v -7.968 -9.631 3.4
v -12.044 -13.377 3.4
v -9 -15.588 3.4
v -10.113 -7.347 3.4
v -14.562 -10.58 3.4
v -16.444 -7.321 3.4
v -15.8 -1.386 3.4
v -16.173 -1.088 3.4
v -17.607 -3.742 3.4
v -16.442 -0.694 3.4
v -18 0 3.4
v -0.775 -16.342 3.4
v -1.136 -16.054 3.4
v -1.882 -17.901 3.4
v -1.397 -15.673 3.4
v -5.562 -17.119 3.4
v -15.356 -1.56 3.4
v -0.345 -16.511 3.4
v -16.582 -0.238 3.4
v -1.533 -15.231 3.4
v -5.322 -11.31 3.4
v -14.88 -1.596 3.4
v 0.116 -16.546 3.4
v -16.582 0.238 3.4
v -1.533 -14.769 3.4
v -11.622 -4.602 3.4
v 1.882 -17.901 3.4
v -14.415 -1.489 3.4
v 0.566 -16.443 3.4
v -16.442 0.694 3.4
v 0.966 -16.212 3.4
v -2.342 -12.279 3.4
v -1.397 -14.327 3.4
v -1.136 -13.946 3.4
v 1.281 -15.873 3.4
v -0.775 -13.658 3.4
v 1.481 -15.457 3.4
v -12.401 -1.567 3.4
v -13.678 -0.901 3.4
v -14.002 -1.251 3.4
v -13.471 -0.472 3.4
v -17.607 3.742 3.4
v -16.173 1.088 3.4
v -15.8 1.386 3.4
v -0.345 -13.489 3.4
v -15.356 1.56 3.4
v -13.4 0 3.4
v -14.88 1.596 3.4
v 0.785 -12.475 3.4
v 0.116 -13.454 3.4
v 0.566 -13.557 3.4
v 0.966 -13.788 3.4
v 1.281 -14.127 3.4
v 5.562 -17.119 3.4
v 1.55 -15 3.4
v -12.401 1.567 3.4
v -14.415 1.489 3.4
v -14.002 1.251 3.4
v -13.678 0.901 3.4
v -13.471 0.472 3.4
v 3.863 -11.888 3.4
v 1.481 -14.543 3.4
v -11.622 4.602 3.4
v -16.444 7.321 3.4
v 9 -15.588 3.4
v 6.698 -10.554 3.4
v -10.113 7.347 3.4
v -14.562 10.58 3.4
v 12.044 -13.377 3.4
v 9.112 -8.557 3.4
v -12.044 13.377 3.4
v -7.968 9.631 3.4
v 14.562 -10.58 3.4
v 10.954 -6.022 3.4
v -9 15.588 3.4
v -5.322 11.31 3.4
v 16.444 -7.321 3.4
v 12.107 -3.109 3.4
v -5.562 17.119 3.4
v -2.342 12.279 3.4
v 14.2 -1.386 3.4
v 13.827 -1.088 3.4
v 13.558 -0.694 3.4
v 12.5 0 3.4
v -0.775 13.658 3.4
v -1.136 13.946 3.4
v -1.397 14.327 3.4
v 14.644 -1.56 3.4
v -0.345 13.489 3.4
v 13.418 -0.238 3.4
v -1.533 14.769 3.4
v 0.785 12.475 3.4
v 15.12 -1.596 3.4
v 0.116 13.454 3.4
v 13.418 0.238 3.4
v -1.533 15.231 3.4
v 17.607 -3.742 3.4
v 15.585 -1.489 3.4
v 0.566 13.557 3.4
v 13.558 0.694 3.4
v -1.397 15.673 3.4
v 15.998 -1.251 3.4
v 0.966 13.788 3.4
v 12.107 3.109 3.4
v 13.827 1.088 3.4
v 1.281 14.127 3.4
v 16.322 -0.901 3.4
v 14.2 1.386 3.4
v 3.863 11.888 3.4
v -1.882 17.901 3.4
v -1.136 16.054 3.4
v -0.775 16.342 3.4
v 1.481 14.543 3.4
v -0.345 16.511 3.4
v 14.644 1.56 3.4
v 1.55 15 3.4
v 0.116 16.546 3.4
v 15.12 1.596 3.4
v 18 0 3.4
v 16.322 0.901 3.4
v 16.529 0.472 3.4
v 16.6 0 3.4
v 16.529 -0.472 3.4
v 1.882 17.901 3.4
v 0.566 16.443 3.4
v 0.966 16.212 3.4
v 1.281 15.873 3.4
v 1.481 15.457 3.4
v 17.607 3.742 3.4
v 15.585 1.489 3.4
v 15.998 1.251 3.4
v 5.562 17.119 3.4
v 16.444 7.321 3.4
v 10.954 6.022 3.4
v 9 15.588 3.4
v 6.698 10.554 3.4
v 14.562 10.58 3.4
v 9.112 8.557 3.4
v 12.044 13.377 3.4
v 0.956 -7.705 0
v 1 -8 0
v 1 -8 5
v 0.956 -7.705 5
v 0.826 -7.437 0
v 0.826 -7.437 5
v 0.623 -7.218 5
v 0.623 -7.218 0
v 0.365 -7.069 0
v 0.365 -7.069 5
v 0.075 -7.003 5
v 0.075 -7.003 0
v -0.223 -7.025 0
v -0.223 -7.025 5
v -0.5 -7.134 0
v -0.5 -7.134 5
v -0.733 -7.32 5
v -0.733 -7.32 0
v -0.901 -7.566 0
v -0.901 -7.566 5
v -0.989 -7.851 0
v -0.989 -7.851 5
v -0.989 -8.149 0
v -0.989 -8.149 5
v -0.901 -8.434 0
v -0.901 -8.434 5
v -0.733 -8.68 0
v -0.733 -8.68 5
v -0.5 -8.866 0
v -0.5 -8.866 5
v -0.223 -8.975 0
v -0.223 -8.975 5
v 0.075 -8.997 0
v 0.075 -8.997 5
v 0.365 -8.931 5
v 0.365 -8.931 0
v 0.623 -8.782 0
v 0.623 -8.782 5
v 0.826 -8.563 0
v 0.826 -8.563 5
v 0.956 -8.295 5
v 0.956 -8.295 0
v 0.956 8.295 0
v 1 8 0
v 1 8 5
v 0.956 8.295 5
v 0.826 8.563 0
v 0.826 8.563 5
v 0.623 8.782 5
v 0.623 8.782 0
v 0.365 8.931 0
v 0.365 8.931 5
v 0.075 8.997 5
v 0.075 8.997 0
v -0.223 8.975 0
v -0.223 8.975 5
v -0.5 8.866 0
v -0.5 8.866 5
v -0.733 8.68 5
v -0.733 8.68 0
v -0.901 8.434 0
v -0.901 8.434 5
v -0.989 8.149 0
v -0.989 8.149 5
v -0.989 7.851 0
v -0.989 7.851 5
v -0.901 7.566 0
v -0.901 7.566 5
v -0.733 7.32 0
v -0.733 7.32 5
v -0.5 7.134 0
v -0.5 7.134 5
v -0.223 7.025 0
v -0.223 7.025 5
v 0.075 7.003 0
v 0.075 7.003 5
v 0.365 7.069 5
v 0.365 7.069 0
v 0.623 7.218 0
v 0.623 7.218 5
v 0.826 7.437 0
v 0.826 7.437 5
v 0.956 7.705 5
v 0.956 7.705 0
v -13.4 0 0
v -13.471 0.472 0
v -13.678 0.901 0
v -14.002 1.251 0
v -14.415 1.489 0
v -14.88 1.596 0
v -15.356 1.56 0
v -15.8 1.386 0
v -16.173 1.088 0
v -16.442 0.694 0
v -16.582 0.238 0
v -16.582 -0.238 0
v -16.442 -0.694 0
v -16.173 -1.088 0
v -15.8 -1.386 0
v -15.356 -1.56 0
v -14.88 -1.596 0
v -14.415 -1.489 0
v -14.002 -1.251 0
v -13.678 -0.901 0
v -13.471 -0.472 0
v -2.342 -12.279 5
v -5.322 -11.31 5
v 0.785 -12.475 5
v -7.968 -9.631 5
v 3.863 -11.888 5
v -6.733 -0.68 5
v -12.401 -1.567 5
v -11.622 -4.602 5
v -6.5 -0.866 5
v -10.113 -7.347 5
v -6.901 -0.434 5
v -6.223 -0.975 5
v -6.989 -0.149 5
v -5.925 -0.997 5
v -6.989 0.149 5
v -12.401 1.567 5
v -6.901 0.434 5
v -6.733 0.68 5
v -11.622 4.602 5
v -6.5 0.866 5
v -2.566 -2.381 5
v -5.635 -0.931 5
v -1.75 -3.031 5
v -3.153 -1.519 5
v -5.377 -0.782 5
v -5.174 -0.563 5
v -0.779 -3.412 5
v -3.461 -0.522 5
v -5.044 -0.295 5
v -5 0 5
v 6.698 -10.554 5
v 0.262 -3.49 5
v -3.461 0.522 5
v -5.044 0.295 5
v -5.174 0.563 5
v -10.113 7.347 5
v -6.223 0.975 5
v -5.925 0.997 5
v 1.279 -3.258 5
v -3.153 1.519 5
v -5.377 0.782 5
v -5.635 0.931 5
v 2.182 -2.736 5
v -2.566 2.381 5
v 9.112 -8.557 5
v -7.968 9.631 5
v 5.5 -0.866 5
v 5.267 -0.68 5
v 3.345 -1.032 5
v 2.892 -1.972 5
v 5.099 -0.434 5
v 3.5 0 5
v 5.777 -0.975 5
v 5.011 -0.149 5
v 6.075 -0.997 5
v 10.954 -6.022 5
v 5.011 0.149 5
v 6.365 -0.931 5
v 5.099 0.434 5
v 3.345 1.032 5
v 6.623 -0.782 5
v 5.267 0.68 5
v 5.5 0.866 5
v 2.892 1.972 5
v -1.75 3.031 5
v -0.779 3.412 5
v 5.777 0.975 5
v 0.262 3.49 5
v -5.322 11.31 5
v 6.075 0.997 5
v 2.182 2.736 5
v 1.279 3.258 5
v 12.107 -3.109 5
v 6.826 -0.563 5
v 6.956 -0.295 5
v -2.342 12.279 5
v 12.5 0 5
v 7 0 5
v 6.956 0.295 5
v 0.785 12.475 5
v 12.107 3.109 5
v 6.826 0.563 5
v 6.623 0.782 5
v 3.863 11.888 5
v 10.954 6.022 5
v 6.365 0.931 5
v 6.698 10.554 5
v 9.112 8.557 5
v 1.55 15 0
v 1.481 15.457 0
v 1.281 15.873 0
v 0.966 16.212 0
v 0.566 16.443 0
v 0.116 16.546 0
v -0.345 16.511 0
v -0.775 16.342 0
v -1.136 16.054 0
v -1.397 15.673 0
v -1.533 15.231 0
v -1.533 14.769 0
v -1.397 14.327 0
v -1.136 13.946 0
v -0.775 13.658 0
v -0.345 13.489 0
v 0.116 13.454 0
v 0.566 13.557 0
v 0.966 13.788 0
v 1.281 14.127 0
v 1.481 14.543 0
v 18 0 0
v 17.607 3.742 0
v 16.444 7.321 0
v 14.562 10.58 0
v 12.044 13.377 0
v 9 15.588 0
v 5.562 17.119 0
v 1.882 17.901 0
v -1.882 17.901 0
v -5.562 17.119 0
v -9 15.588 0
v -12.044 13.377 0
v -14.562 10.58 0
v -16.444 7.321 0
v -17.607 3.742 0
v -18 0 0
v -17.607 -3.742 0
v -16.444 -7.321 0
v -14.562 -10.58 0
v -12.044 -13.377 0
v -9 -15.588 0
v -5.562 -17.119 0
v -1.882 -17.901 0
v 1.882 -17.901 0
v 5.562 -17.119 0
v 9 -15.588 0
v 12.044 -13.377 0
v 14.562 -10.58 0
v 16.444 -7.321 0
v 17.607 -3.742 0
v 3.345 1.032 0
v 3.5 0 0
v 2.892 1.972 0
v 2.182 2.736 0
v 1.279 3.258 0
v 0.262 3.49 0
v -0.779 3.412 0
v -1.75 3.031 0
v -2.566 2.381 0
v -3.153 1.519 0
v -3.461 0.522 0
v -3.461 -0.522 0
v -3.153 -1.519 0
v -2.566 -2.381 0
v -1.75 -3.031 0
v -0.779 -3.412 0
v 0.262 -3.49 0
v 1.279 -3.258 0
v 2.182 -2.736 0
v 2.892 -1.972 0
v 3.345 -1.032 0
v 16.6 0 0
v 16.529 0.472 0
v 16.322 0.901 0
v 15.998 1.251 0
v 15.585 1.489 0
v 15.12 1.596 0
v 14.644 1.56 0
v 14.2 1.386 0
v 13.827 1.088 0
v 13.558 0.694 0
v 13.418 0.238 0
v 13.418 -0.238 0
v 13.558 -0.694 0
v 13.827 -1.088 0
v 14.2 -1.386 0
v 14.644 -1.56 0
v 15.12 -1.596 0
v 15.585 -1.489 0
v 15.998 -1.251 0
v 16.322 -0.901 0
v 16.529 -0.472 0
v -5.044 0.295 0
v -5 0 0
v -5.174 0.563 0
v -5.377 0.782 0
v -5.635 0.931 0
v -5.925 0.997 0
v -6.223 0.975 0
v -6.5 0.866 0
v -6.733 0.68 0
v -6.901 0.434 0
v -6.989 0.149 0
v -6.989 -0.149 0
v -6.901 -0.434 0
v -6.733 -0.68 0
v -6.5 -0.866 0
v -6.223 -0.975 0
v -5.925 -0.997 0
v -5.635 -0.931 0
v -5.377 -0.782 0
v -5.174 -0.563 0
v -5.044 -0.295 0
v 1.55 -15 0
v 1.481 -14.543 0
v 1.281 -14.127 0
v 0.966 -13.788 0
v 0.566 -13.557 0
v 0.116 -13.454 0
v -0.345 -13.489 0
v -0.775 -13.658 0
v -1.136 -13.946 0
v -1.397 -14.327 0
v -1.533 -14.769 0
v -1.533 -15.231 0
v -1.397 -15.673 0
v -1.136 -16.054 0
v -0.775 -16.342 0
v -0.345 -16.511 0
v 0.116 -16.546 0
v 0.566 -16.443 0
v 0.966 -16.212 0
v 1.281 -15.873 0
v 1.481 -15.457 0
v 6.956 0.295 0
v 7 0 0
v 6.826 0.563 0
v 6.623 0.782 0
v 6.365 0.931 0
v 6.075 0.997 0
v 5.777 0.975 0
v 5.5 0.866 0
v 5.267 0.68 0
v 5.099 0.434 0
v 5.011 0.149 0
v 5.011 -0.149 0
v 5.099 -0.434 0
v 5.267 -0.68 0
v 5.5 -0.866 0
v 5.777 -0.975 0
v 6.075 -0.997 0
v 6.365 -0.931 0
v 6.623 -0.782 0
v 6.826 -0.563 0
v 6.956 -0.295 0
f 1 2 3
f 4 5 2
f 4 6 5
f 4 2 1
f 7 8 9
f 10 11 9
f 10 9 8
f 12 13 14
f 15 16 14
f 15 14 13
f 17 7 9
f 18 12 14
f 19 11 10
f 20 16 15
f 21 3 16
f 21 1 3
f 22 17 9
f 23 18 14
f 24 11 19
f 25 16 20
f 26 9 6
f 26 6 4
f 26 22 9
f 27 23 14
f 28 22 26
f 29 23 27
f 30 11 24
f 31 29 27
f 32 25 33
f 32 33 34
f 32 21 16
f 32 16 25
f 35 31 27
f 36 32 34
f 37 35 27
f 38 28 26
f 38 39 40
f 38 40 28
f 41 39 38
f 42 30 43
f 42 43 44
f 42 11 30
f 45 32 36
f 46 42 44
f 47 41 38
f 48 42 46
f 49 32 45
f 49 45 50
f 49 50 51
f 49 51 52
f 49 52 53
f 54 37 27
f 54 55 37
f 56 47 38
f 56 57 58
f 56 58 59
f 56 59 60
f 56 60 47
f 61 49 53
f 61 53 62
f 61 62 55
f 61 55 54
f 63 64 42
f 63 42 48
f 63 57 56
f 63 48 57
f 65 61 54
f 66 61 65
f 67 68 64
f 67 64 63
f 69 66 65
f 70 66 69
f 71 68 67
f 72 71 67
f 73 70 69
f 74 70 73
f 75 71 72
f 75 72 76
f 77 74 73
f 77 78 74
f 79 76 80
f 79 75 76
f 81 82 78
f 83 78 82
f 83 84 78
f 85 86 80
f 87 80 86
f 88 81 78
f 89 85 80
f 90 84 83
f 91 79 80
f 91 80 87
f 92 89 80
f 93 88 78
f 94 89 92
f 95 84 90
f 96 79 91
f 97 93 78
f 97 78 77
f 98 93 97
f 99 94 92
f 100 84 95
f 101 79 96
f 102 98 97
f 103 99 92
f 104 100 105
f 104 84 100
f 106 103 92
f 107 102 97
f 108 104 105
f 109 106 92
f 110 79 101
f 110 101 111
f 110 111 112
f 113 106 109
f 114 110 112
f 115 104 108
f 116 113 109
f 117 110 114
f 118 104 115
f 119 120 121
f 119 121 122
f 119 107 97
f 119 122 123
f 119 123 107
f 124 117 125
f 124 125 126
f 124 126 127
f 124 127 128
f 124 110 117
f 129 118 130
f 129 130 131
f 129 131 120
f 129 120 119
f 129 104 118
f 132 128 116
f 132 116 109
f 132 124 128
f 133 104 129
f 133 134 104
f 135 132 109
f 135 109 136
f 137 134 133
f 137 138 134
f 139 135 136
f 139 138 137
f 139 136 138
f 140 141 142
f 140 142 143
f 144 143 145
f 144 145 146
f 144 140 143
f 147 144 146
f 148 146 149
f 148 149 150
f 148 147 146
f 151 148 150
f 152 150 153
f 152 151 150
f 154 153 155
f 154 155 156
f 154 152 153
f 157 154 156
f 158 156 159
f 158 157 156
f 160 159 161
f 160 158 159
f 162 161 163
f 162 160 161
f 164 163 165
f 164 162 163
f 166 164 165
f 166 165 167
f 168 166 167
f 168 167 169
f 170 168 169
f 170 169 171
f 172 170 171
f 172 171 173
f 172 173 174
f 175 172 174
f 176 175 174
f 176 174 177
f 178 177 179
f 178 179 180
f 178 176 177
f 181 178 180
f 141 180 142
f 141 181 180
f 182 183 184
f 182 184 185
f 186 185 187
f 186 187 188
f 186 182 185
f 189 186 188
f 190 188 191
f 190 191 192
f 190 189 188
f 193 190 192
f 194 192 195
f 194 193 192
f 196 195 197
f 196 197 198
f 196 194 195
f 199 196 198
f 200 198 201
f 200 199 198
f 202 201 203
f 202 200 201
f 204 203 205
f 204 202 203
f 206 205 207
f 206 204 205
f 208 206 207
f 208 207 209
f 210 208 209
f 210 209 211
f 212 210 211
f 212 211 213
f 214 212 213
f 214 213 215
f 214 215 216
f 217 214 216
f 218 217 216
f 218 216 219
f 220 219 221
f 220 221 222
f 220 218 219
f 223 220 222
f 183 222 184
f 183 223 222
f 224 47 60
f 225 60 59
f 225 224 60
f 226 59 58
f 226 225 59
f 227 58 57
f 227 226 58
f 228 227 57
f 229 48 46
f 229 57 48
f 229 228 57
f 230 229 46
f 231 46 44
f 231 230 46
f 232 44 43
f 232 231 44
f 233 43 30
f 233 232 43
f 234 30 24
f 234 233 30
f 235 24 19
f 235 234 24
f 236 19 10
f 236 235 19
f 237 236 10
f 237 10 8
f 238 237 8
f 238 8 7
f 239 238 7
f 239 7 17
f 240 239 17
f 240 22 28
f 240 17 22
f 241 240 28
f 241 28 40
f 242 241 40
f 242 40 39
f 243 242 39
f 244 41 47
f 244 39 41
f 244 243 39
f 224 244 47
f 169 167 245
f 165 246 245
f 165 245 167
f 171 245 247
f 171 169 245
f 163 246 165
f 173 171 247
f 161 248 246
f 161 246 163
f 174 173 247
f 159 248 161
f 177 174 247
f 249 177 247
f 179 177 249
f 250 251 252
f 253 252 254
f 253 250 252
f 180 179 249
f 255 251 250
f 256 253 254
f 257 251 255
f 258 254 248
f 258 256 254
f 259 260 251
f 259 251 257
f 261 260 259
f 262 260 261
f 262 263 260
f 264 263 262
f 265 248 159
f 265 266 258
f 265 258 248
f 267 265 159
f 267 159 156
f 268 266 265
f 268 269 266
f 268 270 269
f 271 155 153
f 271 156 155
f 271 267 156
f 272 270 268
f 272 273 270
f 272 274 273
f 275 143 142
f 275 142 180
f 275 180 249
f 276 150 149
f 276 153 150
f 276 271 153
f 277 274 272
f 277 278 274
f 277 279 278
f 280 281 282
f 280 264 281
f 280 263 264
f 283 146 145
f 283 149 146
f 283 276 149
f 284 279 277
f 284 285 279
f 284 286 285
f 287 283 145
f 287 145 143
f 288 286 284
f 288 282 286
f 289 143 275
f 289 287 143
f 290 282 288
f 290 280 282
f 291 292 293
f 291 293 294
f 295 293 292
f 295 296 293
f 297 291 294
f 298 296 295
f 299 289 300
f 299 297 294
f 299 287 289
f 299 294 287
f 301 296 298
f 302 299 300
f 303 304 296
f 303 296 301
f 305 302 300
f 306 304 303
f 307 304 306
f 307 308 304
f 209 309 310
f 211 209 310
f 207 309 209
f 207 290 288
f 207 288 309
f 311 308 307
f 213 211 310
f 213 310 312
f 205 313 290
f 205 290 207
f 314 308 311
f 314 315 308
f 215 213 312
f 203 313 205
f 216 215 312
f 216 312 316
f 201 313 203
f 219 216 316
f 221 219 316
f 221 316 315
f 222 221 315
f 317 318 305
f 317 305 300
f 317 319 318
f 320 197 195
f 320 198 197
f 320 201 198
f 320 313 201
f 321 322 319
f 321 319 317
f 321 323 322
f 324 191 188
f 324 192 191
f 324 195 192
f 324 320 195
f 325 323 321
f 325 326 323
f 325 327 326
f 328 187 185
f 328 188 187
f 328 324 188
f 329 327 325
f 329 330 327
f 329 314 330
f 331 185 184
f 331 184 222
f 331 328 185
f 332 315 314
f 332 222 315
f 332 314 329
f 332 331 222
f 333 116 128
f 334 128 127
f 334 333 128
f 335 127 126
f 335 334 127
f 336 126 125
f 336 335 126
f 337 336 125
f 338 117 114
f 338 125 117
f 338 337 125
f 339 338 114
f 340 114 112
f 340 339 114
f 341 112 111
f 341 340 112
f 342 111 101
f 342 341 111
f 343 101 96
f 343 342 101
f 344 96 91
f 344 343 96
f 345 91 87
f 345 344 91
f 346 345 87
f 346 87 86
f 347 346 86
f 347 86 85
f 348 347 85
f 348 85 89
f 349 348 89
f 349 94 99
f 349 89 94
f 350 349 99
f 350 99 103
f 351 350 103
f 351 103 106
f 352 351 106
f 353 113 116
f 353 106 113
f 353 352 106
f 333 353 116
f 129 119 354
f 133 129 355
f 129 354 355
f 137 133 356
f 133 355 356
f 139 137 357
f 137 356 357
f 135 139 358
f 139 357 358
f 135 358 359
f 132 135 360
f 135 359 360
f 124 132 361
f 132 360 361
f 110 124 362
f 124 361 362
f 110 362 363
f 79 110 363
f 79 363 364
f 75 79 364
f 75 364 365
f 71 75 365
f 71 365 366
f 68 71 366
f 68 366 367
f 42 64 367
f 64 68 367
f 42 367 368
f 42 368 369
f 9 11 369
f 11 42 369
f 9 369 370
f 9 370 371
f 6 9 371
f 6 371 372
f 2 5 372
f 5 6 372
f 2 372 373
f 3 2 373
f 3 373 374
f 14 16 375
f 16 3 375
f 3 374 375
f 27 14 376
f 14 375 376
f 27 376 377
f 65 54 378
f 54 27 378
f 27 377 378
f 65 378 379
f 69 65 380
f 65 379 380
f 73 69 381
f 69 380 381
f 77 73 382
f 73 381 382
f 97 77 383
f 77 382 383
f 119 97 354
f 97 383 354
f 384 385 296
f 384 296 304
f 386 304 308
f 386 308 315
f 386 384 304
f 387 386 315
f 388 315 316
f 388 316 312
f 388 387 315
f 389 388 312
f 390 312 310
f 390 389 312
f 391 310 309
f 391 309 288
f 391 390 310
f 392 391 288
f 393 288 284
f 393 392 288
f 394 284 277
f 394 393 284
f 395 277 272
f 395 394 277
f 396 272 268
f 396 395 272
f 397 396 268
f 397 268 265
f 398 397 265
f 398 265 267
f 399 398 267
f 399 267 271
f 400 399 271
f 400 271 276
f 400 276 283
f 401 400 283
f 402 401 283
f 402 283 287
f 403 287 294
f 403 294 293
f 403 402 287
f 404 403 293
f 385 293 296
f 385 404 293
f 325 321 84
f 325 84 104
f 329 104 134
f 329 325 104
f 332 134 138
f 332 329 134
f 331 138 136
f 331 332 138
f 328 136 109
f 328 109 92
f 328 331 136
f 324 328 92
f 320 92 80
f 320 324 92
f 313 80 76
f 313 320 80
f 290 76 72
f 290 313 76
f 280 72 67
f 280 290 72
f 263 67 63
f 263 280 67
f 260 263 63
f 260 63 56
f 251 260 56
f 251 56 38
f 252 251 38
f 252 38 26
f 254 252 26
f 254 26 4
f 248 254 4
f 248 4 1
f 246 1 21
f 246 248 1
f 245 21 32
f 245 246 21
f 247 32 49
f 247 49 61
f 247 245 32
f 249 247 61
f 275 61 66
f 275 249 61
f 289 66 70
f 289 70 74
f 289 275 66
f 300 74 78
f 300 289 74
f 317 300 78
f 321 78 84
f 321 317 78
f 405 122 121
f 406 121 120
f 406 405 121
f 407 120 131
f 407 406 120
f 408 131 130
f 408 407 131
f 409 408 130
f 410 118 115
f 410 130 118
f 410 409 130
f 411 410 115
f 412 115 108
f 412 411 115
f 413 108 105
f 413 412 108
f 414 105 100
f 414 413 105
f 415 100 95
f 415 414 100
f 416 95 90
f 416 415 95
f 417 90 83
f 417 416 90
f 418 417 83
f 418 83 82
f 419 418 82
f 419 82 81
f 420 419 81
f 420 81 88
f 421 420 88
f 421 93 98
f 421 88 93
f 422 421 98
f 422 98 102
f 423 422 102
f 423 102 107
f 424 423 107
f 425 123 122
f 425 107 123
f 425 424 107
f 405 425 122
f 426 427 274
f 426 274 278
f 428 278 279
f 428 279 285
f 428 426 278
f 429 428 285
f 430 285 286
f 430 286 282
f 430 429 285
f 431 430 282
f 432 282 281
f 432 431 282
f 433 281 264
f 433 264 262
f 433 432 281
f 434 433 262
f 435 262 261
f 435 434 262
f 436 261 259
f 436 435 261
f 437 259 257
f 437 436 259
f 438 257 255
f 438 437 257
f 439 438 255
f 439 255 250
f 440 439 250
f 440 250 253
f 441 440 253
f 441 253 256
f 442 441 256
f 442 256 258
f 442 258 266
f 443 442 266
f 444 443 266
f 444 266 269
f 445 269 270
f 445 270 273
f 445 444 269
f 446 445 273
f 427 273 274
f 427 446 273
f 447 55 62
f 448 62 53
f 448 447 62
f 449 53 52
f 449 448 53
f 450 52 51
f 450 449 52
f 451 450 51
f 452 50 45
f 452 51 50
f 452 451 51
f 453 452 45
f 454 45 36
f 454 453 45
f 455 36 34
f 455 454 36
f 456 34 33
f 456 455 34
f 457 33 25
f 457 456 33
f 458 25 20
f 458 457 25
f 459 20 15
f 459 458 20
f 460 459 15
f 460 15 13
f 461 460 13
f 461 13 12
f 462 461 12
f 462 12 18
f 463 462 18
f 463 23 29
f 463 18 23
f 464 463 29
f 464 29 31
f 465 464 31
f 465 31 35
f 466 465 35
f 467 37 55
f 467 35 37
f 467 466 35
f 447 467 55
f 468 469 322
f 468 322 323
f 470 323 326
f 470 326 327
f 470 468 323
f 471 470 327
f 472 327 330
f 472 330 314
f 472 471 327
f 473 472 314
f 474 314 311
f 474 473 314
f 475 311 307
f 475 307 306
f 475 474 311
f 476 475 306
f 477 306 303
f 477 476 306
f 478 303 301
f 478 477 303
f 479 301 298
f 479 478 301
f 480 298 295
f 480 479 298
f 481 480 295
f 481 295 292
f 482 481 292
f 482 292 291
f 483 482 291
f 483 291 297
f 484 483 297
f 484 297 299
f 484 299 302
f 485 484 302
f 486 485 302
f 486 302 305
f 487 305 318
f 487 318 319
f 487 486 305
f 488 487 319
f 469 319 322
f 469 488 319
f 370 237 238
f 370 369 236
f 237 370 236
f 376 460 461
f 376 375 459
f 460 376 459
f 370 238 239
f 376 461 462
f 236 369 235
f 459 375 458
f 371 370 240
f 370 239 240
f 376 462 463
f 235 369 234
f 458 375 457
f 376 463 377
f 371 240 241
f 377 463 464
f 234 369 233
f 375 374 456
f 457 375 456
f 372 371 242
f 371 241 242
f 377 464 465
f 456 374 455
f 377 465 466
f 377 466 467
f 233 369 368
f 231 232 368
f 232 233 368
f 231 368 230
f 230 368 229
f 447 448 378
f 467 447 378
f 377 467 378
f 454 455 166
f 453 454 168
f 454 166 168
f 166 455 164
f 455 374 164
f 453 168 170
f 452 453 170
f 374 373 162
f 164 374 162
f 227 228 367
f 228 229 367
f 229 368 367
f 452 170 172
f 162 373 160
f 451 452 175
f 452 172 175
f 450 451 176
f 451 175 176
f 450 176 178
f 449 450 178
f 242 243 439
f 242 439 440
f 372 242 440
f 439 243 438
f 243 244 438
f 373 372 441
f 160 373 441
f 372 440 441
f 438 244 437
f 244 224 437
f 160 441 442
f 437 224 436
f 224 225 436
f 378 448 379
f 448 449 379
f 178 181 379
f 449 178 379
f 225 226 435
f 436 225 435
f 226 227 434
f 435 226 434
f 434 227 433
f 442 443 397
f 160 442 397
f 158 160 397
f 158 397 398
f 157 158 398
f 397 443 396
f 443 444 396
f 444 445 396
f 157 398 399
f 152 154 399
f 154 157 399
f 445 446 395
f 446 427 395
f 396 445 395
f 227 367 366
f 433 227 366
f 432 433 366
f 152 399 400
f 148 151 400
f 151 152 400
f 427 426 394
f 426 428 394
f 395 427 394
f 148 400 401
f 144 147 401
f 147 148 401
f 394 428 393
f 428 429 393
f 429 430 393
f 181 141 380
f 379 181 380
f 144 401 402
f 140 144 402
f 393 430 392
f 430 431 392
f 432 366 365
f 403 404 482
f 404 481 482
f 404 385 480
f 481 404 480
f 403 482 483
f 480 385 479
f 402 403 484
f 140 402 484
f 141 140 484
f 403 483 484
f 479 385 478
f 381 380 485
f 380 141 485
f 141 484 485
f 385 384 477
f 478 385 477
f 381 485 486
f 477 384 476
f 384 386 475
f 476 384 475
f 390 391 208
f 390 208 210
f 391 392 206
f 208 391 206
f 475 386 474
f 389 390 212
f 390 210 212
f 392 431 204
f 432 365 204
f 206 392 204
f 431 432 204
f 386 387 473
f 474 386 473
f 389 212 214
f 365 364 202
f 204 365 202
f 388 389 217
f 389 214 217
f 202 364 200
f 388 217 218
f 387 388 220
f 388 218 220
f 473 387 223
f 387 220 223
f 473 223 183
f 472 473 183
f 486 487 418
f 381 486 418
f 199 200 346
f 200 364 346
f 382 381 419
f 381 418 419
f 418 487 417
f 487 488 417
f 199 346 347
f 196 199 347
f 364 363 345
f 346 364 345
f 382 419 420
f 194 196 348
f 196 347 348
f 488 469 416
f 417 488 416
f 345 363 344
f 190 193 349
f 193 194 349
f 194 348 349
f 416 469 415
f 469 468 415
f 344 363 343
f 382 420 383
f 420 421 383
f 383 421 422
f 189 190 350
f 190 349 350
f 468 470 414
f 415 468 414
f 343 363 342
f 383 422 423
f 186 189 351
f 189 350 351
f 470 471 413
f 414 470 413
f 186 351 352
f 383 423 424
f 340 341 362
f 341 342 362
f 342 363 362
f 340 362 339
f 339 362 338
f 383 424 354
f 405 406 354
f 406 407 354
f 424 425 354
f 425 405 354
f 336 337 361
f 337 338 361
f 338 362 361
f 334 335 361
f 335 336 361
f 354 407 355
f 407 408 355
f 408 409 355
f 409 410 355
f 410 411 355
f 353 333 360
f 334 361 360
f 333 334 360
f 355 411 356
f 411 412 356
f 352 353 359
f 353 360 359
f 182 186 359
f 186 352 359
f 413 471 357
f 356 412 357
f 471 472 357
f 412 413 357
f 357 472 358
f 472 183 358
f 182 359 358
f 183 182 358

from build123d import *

# Parameters (mm, degrees)
SKETCH001_R      = 40
SKETCH001_R_2    = 12.5
EXTRUDE001_DEPTH = 1.6
SKETCH_R         = 18
SKETCH_R_2       = 1.55
SKETCH_R_3       = 1.6
SKETCH_R_4       = 3.5
SKETCH_R_5       = 1
EXTRUDE_DEPTH    = 5


with BuildPart() as extrude001:
    # Sketch001 (on Face7 of Extrude) → Extrude001 (new body)
    with BuildSketch(Plane.XY.offset(5)):
        Circle(SKETCH001_R)
        Circle(SKETCH001_R_2, mode=Mode.SUBTRACT)
    extrude(amount=-EXTRUDE001_DEPTH)


with BuildPart() as cut:
    # Sketch → Extrude (new body)
    with BuildSketch(Plane.XY):
        Circle(SKETCH_R)
        with Locations((0, 15)):
            Circle(SKETCH_R_2, mode=Mode.SUBTRACT)
        with Locations((-15, 0)):
            Circle(SKETCH_R_3, mode=Mode.SUBTRACT)
        with Locations((15, 0)):
            Circle(SKETCH_R_3, mode=Mode.SUBTRACT)
        with Locations((0, -15)):
            Circle(SKETCH_R_2, mode=Mode.SUBTRACT)
        Circle(SKETCH_R_4, mode=Mode.SUBTRACT)
        with Locations((0, 8)):
            Circle(SKETCH_R_5, mode=Mode.SUBTRACT)
        with Locations((6, 0)):
            Circle(SKETCH_R_5, mode=Mode.SUBTRACT)
        with Locations((0, -8)):
            Circle(SKETCH_R_5, mode=Mode.SUBTRACT)
        with Locations((-6, 0)):
            Circle(SKETCH_R_5, mode=Mode.SUBTRACT)
    extrude(amount=EXTRUDE_DEPTH)

    # Cut: cut Extrude001
    add(extrude001.part, mode=Mode.SUBTRACT)


solid = cut.part
